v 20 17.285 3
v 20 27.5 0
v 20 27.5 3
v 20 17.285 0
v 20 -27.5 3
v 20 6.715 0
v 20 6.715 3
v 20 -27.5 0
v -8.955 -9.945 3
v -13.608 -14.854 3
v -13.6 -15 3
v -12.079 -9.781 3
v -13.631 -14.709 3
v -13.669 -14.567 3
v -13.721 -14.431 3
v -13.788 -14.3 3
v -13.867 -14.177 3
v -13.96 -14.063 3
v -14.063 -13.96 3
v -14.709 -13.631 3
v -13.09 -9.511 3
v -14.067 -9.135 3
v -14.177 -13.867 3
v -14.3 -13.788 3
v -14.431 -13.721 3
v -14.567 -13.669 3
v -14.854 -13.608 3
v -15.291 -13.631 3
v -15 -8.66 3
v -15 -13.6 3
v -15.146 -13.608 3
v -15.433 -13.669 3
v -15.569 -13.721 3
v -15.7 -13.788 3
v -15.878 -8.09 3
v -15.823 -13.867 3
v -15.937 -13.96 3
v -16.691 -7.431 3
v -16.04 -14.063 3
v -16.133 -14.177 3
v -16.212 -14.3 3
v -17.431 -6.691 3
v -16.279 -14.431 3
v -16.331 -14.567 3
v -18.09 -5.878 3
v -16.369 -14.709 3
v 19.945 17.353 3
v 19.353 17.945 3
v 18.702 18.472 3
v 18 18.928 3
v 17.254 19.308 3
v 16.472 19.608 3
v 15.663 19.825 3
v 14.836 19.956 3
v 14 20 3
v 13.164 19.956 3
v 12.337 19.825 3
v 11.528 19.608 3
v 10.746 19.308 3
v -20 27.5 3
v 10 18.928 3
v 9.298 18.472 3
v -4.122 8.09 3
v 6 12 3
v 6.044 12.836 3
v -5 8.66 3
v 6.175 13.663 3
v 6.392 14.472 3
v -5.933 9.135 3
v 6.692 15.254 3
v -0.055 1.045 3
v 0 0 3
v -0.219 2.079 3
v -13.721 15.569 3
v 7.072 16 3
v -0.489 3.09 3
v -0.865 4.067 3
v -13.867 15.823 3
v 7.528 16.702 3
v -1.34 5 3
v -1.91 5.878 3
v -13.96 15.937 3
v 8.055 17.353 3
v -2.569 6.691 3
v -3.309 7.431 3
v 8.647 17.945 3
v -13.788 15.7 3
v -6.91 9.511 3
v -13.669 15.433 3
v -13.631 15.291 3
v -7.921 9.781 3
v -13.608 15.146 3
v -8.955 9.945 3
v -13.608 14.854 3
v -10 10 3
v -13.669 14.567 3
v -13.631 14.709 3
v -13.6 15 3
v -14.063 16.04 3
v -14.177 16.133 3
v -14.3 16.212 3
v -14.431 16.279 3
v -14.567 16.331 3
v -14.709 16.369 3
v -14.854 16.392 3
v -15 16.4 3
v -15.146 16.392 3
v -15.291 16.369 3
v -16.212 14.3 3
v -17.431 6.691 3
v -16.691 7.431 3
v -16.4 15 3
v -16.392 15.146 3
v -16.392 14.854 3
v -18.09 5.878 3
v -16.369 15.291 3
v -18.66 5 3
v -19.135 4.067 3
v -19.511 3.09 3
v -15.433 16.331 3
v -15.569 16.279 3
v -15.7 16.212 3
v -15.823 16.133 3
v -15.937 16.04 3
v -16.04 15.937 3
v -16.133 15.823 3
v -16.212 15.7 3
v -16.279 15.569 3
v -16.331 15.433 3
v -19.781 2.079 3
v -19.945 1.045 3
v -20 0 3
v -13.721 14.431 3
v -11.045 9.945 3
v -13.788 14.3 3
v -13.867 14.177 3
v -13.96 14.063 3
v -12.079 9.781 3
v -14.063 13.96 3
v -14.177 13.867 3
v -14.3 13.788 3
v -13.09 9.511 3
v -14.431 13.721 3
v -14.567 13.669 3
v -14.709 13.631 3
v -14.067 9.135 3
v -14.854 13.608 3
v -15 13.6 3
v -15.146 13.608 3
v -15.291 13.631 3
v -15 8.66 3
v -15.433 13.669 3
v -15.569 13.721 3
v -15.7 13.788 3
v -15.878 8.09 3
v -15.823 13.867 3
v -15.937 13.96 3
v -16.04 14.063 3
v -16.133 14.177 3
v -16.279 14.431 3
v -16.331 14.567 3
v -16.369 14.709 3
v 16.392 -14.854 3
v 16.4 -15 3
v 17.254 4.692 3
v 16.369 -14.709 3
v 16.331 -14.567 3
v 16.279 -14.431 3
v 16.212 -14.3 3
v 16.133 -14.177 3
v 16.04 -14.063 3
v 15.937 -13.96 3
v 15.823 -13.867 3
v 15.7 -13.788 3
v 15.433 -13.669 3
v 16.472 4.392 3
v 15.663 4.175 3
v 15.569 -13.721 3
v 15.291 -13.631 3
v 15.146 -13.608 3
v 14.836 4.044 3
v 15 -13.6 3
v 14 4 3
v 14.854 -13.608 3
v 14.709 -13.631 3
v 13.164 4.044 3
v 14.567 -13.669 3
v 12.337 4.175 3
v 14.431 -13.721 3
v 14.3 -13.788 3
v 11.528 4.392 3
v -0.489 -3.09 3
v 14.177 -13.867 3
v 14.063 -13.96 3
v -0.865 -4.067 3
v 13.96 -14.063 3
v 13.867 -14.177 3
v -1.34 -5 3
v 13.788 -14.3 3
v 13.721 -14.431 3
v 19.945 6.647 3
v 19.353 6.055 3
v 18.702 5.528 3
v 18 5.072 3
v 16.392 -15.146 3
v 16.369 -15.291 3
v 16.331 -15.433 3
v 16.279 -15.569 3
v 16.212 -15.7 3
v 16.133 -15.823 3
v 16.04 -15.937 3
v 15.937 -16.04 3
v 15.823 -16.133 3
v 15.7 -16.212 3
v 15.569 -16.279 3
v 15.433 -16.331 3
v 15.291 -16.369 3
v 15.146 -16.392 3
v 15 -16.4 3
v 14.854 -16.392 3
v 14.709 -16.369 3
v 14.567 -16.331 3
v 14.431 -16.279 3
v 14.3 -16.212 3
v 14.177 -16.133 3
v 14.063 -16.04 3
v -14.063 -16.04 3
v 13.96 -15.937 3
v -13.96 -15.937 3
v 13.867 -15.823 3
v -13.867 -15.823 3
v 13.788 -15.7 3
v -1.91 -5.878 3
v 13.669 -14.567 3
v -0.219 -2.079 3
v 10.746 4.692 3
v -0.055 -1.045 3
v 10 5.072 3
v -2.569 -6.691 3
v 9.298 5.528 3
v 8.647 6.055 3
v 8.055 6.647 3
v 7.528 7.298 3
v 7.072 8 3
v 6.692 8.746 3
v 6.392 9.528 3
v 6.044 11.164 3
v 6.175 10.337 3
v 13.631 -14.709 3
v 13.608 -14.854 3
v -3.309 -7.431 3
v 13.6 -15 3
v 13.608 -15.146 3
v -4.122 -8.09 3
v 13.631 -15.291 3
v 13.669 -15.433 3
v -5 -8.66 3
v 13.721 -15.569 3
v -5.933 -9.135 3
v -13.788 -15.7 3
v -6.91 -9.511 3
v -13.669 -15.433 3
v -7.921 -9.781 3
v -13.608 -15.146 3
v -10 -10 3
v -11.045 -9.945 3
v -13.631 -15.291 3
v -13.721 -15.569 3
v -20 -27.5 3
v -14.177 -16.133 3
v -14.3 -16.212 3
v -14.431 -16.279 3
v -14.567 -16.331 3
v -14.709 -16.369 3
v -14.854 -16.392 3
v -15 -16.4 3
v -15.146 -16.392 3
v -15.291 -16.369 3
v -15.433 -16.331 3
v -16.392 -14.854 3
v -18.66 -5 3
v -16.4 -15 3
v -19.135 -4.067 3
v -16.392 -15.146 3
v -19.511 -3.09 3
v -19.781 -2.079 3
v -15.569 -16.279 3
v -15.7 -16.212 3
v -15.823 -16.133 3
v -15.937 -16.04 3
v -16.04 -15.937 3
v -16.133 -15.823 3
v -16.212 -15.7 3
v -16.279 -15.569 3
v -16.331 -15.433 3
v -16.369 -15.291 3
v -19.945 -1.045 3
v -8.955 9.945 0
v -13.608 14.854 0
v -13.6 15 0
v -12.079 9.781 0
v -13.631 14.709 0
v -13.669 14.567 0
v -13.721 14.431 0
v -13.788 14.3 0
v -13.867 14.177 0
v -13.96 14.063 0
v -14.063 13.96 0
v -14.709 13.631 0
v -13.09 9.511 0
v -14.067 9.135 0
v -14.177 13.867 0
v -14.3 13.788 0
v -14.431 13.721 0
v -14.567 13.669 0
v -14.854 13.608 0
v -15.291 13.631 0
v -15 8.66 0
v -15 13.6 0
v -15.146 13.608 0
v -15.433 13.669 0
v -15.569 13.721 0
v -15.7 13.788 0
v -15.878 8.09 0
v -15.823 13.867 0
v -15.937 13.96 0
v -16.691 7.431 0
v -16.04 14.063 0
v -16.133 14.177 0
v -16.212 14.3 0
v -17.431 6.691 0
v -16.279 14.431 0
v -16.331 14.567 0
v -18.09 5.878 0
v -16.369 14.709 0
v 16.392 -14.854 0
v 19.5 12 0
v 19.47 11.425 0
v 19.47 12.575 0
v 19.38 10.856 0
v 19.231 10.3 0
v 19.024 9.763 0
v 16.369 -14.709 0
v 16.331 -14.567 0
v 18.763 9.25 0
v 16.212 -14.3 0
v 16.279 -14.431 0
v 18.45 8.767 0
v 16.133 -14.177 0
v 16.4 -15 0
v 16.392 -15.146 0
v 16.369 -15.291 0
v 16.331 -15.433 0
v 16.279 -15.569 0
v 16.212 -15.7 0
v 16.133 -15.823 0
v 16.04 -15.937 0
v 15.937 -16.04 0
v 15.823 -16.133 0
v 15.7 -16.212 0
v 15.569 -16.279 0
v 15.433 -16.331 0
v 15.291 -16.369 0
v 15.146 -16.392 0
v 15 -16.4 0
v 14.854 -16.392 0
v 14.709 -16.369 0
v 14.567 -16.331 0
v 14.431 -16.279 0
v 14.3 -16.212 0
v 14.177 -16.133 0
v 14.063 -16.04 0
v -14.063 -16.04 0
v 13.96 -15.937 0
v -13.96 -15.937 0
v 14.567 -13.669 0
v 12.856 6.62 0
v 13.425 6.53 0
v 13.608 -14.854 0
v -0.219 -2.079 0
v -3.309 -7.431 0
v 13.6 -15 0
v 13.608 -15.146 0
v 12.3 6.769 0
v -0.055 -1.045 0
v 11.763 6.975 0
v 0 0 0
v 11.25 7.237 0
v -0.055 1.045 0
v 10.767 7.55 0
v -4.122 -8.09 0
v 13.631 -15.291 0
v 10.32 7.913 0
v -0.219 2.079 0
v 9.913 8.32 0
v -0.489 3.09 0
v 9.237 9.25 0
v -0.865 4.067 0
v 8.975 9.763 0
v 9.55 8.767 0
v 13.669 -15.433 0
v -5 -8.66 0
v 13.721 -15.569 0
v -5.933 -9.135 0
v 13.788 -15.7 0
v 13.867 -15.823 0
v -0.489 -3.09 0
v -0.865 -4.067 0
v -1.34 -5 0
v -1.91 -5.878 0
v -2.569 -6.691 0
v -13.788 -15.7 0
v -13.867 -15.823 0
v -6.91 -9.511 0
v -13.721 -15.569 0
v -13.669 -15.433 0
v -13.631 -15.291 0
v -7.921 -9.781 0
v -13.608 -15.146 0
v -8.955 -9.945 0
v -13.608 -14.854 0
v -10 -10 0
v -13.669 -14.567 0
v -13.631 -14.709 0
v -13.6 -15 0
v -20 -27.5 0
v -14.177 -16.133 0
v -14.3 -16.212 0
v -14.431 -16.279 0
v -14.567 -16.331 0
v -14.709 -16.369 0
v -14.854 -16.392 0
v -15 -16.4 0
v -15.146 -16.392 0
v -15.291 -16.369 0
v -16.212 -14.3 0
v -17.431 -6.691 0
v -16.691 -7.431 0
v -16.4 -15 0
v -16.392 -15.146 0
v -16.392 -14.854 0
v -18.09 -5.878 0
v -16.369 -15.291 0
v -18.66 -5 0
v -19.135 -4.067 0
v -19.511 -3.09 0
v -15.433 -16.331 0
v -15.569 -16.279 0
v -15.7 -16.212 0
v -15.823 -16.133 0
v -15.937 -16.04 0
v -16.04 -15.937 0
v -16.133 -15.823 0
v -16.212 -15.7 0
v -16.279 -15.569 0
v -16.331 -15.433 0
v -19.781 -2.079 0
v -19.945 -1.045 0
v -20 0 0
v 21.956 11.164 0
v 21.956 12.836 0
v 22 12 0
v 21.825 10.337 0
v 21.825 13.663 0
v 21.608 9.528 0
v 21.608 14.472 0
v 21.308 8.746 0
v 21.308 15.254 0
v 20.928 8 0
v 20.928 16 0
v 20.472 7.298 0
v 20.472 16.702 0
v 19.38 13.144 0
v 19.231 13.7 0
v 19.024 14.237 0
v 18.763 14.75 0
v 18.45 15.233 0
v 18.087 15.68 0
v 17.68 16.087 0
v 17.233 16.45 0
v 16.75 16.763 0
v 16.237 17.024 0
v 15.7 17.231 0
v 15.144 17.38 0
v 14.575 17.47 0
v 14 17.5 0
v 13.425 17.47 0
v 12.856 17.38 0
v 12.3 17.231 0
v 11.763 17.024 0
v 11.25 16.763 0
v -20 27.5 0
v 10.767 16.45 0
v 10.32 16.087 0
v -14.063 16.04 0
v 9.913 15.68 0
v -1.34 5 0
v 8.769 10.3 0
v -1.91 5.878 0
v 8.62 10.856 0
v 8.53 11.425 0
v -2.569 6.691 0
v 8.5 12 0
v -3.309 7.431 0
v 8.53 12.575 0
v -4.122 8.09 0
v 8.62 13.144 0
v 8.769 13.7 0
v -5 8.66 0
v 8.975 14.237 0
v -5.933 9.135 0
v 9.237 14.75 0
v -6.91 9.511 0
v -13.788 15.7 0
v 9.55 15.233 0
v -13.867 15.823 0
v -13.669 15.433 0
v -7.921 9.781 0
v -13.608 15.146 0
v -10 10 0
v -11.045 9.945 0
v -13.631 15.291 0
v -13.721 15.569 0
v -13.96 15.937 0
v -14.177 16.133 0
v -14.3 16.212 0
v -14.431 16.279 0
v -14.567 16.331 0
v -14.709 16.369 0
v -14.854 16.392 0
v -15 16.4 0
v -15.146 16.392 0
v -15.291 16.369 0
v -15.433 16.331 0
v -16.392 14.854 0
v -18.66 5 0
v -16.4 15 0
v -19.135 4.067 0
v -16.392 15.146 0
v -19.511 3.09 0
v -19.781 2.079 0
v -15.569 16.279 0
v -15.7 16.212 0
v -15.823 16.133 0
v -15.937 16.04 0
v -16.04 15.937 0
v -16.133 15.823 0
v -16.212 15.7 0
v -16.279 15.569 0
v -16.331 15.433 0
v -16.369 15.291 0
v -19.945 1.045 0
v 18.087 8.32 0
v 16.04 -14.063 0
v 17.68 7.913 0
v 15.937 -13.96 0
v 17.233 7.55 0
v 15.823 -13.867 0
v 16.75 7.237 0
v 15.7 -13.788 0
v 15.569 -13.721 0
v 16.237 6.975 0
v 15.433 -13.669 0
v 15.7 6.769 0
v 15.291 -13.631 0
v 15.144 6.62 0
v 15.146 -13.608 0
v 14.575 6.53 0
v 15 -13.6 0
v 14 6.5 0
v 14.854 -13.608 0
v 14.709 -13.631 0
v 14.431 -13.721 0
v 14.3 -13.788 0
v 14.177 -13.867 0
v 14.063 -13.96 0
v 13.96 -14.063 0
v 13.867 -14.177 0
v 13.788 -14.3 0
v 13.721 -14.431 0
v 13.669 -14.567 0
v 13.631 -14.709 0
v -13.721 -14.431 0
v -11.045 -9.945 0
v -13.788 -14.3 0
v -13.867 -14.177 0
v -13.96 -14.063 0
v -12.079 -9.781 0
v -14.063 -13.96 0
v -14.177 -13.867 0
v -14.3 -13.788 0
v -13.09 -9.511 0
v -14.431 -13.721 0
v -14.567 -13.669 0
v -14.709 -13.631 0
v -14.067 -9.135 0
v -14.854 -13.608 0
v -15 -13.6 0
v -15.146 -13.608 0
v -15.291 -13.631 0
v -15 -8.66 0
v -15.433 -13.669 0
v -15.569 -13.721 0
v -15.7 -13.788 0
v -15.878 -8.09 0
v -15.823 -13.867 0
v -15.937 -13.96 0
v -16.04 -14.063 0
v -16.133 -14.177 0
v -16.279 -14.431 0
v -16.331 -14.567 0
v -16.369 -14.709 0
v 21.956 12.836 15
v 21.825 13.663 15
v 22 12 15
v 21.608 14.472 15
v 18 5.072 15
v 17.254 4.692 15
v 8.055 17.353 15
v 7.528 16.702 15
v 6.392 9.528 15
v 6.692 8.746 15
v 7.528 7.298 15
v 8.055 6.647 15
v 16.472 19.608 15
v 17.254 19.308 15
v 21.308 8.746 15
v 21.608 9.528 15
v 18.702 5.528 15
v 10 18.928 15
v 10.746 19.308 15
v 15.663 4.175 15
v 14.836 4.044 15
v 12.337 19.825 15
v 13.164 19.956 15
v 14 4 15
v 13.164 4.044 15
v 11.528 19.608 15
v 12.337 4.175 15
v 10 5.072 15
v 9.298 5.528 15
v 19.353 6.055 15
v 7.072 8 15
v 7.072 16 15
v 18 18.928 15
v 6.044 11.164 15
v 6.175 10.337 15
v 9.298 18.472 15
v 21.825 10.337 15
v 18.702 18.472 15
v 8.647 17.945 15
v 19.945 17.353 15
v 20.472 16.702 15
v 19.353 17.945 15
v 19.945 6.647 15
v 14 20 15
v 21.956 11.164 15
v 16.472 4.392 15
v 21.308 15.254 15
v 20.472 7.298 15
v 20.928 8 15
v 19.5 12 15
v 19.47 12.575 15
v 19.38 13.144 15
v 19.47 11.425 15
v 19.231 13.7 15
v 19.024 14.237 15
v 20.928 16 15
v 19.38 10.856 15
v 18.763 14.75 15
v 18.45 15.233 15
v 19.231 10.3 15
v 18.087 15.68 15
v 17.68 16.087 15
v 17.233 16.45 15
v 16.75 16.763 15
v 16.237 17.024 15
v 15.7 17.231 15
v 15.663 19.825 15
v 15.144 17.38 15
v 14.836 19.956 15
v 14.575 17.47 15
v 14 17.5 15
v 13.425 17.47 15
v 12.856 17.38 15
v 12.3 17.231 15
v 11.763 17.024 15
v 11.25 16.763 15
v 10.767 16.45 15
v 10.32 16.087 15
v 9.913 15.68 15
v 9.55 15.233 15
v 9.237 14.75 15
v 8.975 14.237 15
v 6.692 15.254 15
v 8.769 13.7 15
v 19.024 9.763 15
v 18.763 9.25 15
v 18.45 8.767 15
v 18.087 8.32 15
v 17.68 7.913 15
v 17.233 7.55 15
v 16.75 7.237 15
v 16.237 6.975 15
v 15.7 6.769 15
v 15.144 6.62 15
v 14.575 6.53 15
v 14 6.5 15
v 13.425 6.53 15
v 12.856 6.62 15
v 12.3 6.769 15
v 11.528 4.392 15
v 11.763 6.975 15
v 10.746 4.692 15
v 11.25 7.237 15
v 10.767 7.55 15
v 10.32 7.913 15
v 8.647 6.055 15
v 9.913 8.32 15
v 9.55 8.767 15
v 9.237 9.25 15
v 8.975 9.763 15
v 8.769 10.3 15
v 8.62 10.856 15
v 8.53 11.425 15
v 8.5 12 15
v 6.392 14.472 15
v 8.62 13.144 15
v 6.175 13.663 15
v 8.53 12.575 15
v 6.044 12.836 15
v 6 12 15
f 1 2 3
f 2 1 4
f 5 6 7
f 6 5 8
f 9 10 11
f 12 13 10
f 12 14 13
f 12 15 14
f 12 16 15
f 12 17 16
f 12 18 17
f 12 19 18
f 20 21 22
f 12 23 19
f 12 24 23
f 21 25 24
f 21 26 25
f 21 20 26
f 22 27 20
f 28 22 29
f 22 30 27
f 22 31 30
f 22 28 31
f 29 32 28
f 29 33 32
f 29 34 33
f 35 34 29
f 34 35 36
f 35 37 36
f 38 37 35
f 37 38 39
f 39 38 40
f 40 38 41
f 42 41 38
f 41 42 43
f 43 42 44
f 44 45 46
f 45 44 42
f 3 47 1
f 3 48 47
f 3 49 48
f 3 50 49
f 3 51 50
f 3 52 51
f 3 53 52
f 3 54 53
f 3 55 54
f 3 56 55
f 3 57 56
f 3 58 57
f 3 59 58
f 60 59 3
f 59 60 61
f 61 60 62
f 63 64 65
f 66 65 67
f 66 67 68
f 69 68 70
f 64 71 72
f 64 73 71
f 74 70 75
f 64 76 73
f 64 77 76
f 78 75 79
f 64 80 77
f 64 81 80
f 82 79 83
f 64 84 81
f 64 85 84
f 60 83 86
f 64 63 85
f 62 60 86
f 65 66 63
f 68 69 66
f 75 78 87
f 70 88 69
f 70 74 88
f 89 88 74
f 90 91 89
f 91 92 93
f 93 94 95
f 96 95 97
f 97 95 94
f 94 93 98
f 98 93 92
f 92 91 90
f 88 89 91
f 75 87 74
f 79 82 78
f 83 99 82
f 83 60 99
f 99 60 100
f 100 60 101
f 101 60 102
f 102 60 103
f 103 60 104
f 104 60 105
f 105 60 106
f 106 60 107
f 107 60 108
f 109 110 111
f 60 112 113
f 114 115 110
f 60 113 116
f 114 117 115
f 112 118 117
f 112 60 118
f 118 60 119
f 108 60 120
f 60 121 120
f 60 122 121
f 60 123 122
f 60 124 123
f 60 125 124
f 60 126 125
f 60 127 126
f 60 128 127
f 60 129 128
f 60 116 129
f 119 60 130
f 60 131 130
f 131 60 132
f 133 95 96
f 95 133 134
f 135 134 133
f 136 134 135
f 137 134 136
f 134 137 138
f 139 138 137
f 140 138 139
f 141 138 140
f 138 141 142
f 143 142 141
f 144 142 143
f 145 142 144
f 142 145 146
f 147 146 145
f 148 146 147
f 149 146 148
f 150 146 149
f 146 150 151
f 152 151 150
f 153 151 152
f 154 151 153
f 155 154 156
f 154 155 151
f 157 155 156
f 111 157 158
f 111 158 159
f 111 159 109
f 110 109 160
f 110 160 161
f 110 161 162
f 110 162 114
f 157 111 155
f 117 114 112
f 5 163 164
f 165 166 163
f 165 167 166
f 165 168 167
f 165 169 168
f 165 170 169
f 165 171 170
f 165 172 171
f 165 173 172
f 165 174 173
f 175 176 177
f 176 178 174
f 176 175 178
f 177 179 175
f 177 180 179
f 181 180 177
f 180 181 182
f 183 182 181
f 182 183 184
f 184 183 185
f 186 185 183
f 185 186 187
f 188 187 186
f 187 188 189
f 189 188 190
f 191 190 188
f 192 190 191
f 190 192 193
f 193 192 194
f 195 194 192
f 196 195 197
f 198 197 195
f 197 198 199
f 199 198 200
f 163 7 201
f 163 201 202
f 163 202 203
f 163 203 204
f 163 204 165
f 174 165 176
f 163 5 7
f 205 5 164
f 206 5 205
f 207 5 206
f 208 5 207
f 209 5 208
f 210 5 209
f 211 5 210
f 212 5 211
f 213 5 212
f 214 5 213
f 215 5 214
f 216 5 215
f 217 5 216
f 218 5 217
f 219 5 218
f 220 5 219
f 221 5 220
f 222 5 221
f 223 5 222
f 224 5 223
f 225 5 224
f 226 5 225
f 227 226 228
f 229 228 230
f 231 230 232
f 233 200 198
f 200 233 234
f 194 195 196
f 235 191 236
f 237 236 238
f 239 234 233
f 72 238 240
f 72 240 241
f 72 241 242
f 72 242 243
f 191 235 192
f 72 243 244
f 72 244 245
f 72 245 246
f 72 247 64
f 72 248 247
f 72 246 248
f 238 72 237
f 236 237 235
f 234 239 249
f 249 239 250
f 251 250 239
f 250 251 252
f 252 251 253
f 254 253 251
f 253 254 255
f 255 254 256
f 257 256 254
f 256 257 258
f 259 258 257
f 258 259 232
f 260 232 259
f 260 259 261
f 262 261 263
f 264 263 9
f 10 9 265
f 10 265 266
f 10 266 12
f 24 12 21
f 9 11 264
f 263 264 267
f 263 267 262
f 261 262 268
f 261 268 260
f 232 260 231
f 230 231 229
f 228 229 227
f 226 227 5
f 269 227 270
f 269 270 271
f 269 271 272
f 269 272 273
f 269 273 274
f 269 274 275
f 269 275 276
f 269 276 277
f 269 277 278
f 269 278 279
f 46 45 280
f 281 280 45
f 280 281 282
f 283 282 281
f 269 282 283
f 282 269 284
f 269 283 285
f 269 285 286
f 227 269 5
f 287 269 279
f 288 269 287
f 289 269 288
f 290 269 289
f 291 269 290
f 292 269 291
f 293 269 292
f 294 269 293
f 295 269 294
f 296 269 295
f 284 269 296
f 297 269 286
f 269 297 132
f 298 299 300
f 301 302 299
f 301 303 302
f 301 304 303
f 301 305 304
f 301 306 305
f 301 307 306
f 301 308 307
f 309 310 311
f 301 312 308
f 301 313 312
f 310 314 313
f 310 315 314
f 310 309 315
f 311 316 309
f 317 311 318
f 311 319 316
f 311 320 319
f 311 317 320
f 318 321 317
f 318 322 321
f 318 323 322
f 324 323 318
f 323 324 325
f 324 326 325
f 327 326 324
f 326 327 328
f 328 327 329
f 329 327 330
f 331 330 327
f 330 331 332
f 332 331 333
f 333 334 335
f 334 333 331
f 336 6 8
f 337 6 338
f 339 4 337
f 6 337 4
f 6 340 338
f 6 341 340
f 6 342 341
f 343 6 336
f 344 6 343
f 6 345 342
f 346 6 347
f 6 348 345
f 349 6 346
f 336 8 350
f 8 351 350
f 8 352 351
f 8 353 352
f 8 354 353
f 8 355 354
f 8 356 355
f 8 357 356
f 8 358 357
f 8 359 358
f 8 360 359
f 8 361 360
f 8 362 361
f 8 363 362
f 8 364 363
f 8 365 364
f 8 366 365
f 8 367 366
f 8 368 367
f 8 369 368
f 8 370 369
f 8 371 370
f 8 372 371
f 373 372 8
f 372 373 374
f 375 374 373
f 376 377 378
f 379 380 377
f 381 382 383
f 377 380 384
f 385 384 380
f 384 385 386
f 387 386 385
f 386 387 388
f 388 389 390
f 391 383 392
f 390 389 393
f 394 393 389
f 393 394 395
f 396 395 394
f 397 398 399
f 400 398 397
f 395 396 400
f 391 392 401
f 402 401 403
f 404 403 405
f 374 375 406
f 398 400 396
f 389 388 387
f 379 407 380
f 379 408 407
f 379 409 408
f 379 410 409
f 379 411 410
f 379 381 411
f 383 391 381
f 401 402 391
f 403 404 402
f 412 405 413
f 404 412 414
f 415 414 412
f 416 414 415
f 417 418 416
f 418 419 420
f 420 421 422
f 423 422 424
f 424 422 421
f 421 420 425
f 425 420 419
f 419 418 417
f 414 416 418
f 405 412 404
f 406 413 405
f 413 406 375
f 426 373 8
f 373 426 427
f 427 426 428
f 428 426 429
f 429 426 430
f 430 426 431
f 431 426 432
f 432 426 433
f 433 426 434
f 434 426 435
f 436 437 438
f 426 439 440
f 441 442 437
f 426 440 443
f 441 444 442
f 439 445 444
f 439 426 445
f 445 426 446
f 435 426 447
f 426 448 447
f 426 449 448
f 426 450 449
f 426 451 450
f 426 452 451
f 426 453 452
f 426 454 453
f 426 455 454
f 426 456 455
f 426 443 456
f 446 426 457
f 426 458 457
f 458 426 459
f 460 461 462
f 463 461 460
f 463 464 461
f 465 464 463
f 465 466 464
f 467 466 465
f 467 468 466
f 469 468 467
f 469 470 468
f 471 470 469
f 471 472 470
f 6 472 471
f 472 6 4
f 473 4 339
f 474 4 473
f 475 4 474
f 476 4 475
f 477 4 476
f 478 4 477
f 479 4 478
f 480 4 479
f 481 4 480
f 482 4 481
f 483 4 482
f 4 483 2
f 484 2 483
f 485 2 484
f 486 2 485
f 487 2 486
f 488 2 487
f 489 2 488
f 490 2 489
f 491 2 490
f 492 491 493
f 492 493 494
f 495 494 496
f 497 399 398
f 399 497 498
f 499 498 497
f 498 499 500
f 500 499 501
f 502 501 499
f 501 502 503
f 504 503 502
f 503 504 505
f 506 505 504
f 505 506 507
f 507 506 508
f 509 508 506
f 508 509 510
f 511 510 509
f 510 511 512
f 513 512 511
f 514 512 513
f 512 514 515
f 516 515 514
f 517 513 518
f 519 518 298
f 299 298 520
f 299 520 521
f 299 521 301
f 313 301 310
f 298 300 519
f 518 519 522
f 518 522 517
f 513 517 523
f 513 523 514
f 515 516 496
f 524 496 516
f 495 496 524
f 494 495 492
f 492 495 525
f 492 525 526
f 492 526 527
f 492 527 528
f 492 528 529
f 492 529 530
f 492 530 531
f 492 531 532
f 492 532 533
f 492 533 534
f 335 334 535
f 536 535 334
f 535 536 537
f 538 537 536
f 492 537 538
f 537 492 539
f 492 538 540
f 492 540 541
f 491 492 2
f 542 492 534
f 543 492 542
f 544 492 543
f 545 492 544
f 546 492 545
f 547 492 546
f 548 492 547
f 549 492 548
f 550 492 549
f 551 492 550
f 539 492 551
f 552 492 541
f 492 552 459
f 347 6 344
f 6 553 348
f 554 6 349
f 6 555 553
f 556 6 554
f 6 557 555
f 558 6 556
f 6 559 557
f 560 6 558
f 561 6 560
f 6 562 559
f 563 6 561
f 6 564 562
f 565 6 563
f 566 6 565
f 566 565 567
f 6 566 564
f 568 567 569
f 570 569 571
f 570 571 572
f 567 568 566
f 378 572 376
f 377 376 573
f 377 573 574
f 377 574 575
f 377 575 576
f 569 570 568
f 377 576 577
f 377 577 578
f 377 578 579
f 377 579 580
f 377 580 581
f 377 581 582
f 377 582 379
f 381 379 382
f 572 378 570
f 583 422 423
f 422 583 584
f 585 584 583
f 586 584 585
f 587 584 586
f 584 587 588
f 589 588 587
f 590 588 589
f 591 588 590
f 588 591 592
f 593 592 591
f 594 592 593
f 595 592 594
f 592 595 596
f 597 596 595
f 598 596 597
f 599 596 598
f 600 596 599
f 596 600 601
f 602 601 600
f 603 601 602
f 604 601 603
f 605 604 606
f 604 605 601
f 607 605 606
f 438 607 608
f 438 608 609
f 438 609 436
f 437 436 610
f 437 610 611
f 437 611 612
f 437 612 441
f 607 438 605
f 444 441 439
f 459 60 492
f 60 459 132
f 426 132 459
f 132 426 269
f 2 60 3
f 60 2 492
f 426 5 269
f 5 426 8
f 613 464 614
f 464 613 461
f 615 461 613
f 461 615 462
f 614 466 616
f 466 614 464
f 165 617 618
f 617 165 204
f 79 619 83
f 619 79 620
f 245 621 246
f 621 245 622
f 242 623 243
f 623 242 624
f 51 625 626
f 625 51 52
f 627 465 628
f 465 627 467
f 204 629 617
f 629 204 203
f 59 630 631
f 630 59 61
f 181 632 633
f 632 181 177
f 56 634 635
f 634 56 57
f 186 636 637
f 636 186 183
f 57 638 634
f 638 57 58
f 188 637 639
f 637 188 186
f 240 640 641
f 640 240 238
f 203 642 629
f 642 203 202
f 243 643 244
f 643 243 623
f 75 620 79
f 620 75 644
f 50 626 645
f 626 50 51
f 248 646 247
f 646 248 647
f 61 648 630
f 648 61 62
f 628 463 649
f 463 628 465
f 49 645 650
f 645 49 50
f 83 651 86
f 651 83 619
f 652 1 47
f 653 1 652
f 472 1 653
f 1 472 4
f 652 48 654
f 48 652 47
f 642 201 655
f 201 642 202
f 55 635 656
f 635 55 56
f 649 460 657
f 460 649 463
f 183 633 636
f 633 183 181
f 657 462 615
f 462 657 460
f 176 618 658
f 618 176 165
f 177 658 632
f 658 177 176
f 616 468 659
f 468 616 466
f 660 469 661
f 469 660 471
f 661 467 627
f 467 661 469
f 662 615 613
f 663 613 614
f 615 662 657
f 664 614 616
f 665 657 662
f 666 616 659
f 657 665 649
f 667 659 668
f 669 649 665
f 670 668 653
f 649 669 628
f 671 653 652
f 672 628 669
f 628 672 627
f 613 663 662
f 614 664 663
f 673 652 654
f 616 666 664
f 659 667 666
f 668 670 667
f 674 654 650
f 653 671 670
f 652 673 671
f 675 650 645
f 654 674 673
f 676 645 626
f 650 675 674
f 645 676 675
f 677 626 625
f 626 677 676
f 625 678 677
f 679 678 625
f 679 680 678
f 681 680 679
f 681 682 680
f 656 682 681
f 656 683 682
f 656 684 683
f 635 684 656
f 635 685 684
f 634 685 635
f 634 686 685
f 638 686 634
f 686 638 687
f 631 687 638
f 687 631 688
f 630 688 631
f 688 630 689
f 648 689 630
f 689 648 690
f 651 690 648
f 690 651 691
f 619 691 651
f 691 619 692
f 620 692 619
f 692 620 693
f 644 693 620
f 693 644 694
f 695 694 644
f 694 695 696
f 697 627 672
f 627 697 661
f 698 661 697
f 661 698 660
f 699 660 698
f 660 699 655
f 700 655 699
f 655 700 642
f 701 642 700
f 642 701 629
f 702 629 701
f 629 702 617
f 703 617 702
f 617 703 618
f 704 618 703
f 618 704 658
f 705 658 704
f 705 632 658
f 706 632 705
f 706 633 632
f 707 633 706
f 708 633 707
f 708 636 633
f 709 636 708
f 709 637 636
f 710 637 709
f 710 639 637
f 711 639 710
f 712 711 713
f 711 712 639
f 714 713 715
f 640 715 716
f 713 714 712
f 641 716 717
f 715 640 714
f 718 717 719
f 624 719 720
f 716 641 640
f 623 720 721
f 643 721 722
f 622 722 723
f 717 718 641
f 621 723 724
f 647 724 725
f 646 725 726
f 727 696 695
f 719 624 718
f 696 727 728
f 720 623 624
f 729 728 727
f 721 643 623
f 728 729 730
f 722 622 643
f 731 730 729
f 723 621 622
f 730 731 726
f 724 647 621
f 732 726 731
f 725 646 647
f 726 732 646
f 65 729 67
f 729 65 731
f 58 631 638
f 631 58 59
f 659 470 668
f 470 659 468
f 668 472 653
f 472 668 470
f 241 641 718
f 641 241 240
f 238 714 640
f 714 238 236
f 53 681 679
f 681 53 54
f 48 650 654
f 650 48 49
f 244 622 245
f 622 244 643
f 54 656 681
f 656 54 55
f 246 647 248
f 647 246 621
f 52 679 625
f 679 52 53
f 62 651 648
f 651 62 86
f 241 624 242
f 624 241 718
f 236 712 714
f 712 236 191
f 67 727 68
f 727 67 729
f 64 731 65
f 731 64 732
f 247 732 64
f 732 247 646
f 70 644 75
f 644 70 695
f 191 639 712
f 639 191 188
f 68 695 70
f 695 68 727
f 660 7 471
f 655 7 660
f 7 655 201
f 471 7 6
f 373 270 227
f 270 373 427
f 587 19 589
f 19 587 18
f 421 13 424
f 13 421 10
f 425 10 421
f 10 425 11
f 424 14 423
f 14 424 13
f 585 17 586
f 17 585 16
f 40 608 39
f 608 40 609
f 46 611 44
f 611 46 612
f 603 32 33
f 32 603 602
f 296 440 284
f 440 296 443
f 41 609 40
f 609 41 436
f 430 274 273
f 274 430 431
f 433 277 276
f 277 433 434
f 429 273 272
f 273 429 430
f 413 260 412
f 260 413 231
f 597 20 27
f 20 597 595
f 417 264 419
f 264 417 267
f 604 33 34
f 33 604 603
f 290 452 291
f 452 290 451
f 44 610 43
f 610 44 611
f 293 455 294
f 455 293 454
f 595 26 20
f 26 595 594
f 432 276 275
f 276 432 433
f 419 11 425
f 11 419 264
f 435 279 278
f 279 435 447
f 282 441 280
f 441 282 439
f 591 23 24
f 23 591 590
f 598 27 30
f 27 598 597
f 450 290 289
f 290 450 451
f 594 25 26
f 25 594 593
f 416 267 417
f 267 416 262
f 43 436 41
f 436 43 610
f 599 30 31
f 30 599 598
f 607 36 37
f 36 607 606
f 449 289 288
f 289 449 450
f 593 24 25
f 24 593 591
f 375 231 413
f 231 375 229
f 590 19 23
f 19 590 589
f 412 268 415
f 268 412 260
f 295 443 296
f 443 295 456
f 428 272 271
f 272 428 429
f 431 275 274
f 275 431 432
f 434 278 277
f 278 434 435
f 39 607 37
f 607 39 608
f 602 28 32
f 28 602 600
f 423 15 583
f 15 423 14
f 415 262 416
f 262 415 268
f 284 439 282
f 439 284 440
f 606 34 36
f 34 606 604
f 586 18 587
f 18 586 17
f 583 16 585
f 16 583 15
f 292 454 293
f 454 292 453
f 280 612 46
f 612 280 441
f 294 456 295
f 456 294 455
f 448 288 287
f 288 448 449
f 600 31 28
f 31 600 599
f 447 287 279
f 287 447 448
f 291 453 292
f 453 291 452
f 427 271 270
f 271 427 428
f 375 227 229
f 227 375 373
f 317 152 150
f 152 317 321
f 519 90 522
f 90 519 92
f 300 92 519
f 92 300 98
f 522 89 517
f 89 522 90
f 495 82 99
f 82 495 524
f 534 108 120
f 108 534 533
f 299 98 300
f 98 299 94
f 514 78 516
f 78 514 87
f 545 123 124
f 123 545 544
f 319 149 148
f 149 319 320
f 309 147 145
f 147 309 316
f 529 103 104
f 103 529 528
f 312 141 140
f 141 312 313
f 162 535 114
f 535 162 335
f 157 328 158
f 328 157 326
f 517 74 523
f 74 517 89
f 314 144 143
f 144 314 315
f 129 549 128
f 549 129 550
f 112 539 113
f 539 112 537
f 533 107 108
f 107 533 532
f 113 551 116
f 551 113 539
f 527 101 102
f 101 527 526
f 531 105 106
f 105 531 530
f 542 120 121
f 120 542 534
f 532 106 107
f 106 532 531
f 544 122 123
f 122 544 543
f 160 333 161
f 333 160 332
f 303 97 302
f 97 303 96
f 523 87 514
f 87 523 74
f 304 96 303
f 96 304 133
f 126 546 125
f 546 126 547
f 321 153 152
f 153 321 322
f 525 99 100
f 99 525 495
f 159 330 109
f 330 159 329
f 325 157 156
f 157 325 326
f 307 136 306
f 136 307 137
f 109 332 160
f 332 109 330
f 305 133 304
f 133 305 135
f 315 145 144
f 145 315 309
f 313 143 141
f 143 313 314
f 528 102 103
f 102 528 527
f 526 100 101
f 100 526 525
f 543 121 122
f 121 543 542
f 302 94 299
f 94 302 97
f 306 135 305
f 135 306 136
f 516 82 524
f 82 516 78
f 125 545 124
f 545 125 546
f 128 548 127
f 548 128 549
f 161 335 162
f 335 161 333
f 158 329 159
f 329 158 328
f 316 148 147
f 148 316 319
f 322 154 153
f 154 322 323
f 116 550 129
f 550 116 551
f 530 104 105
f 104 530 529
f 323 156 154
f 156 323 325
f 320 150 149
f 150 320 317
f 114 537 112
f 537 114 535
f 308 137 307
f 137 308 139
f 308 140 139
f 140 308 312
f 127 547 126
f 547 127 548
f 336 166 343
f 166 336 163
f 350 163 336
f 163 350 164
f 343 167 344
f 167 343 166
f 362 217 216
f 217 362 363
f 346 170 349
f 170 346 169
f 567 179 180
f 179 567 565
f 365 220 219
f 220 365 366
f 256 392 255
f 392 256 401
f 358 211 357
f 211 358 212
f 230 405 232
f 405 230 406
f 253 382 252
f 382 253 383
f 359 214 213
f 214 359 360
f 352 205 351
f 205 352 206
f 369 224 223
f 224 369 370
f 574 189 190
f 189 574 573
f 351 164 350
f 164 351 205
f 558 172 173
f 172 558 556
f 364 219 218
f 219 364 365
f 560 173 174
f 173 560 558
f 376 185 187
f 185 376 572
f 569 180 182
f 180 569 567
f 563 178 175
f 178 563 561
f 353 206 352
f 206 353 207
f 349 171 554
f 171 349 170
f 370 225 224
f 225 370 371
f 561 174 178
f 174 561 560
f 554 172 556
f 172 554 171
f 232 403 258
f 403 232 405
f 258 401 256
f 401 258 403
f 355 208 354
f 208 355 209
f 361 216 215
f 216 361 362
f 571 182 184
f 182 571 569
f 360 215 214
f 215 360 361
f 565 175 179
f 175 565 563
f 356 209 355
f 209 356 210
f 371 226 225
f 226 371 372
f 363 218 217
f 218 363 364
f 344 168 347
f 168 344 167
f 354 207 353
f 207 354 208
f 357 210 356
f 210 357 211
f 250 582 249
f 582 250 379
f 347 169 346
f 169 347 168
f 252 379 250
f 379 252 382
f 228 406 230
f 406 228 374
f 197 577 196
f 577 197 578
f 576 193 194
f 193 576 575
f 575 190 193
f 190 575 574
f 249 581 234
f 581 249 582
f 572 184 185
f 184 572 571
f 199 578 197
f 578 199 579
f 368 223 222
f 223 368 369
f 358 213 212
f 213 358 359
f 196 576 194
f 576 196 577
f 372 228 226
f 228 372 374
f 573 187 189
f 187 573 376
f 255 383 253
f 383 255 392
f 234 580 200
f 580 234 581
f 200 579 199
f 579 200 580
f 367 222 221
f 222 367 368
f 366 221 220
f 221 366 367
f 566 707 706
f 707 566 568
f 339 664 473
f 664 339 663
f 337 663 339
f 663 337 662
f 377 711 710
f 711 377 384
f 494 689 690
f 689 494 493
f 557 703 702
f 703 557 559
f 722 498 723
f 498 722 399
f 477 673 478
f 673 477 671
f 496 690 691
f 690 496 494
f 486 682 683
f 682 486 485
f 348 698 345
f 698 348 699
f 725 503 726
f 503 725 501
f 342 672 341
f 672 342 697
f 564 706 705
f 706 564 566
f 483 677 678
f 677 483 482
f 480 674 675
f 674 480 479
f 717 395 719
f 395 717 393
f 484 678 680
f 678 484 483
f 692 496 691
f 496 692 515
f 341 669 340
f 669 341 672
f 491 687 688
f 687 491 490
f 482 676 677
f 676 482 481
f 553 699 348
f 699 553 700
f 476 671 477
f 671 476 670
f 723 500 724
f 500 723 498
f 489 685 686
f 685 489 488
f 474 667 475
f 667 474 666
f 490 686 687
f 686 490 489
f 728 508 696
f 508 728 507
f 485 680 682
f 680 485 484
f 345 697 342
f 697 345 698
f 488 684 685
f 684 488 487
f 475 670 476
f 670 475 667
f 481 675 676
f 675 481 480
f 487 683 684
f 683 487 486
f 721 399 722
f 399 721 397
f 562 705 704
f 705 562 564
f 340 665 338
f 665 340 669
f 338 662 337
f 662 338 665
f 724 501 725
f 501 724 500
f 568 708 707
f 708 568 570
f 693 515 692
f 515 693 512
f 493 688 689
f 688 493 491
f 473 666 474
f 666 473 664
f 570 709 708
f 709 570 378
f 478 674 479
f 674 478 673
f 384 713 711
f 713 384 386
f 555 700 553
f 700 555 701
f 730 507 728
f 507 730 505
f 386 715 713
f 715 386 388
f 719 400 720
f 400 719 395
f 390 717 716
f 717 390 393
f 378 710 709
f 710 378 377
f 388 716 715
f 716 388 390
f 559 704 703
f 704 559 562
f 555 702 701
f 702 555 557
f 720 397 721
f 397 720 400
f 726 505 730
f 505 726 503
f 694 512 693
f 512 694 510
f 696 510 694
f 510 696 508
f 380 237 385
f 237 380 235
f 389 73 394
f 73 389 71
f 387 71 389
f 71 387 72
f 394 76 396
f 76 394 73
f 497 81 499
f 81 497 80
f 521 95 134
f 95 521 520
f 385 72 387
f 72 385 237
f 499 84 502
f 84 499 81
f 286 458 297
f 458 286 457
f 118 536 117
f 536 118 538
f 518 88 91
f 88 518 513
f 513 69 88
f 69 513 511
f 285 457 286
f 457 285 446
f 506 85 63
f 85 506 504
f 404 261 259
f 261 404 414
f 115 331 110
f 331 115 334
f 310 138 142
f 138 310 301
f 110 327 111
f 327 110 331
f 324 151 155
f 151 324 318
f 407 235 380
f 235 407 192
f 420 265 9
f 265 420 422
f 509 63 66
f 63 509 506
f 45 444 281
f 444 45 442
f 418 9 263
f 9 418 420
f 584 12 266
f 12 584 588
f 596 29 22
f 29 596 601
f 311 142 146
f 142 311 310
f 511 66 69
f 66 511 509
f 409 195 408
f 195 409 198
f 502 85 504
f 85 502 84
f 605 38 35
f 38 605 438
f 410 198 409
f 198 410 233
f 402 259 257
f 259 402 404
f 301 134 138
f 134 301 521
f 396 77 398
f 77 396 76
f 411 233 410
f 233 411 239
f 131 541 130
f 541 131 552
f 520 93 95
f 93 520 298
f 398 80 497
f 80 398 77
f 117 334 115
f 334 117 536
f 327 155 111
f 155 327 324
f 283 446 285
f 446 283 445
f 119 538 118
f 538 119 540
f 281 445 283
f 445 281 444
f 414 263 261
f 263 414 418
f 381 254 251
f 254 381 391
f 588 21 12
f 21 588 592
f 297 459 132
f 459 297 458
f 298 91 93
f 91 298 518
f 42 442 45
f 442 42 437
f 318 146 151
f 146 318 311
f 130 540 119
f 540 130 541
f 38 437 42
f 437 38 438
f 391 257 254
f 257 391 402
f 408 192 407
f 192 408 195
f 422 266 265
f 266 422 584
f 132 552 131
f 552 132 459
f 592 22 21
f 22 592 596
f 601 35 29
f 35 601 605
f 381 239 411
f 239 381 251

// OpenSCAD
// ============================================================
// PART 1: Gimbal Nozzle Bracket
// Mounts Orbit 66190 nozzle alongside IMX219 camera on
// Storm32 gimbal payload plate.
//
// Print: PETG or ABS, 100% infill, 0.2mm layer height
// Hardware: 2x M2.5 screws (shared with camera mount holes)
// Replaces: "3D-Printed Nozzle Bracket" in moreparts.csv ($5)
// ============================================================

// --- Parameters (adjust to your hardware) ---
plate_width      = 40;    // mm — matches Storm32 payload plate
plate_depth      = 55;    // mm
plate_thickness  = 3;     // mm — base plate
nozzle_bore      = 11;    // mm — bore for Orbit 66190 10-32 thread
nozzle_holder_h  = 15;    // mm — height of nozzle holder tube
nozzle_holder_od = 16;    // mm — outer diameter of holder tube
nozzle_offset_x  = 14;    // mm — offset from center (beside camera)

// Mounting holes for Storm32 payload plate (4x M2.5)
mount_hole_dia   = 2.8;   // mm — clearance for M2.5
mount_spacing_x  = 30;    // mm — center-to-center
mount_spacing_y  = 30;    // mm — center-to-center

// Camera cutout (so camera lens is not blocked)
cam_cutout_dia   = 20;    // mm — lens + housing clearance

$fn = 60;

module nozzle_bracket() {
    difference() {
        union() {
            // Base plate
            translate([-plate_width/2, -plate_depth/2, 0])
                cube([plate_width, plate_depth, plate_thickness]);
            
            // Nozzle holder tube
            translate([nozzle_offset_x, 12, 0])
                cylinder(h = nozzle_holder_h, d = nozzle_holder_od);
        }
        
        // Nozzle bore (through the holder tube)
        translate([nozzle_offset_x, 12, -1])
            cylinder(h = nozzle_holder_h + 2, d = nozzle_bore);
        
        // Camera lens clearance hole
        translate([-nozzle_offset_x + 4, 0, -1])
            cylinder(h = plate_thickness + 2, d = cam_cutout_dia);
        
        // 4x M2.5 mounting holes
        for (x = [-mount_spacing_x/2, mount_spacing_x/2])
            for (y = [-mount_spacing_y/2, mount_spacing_y/2])
                translate([x, y, -1])
                    cylinder(h = plate_thickness + 2, d = mount_hole_dia);
    }
}

nozzle_bracket();
